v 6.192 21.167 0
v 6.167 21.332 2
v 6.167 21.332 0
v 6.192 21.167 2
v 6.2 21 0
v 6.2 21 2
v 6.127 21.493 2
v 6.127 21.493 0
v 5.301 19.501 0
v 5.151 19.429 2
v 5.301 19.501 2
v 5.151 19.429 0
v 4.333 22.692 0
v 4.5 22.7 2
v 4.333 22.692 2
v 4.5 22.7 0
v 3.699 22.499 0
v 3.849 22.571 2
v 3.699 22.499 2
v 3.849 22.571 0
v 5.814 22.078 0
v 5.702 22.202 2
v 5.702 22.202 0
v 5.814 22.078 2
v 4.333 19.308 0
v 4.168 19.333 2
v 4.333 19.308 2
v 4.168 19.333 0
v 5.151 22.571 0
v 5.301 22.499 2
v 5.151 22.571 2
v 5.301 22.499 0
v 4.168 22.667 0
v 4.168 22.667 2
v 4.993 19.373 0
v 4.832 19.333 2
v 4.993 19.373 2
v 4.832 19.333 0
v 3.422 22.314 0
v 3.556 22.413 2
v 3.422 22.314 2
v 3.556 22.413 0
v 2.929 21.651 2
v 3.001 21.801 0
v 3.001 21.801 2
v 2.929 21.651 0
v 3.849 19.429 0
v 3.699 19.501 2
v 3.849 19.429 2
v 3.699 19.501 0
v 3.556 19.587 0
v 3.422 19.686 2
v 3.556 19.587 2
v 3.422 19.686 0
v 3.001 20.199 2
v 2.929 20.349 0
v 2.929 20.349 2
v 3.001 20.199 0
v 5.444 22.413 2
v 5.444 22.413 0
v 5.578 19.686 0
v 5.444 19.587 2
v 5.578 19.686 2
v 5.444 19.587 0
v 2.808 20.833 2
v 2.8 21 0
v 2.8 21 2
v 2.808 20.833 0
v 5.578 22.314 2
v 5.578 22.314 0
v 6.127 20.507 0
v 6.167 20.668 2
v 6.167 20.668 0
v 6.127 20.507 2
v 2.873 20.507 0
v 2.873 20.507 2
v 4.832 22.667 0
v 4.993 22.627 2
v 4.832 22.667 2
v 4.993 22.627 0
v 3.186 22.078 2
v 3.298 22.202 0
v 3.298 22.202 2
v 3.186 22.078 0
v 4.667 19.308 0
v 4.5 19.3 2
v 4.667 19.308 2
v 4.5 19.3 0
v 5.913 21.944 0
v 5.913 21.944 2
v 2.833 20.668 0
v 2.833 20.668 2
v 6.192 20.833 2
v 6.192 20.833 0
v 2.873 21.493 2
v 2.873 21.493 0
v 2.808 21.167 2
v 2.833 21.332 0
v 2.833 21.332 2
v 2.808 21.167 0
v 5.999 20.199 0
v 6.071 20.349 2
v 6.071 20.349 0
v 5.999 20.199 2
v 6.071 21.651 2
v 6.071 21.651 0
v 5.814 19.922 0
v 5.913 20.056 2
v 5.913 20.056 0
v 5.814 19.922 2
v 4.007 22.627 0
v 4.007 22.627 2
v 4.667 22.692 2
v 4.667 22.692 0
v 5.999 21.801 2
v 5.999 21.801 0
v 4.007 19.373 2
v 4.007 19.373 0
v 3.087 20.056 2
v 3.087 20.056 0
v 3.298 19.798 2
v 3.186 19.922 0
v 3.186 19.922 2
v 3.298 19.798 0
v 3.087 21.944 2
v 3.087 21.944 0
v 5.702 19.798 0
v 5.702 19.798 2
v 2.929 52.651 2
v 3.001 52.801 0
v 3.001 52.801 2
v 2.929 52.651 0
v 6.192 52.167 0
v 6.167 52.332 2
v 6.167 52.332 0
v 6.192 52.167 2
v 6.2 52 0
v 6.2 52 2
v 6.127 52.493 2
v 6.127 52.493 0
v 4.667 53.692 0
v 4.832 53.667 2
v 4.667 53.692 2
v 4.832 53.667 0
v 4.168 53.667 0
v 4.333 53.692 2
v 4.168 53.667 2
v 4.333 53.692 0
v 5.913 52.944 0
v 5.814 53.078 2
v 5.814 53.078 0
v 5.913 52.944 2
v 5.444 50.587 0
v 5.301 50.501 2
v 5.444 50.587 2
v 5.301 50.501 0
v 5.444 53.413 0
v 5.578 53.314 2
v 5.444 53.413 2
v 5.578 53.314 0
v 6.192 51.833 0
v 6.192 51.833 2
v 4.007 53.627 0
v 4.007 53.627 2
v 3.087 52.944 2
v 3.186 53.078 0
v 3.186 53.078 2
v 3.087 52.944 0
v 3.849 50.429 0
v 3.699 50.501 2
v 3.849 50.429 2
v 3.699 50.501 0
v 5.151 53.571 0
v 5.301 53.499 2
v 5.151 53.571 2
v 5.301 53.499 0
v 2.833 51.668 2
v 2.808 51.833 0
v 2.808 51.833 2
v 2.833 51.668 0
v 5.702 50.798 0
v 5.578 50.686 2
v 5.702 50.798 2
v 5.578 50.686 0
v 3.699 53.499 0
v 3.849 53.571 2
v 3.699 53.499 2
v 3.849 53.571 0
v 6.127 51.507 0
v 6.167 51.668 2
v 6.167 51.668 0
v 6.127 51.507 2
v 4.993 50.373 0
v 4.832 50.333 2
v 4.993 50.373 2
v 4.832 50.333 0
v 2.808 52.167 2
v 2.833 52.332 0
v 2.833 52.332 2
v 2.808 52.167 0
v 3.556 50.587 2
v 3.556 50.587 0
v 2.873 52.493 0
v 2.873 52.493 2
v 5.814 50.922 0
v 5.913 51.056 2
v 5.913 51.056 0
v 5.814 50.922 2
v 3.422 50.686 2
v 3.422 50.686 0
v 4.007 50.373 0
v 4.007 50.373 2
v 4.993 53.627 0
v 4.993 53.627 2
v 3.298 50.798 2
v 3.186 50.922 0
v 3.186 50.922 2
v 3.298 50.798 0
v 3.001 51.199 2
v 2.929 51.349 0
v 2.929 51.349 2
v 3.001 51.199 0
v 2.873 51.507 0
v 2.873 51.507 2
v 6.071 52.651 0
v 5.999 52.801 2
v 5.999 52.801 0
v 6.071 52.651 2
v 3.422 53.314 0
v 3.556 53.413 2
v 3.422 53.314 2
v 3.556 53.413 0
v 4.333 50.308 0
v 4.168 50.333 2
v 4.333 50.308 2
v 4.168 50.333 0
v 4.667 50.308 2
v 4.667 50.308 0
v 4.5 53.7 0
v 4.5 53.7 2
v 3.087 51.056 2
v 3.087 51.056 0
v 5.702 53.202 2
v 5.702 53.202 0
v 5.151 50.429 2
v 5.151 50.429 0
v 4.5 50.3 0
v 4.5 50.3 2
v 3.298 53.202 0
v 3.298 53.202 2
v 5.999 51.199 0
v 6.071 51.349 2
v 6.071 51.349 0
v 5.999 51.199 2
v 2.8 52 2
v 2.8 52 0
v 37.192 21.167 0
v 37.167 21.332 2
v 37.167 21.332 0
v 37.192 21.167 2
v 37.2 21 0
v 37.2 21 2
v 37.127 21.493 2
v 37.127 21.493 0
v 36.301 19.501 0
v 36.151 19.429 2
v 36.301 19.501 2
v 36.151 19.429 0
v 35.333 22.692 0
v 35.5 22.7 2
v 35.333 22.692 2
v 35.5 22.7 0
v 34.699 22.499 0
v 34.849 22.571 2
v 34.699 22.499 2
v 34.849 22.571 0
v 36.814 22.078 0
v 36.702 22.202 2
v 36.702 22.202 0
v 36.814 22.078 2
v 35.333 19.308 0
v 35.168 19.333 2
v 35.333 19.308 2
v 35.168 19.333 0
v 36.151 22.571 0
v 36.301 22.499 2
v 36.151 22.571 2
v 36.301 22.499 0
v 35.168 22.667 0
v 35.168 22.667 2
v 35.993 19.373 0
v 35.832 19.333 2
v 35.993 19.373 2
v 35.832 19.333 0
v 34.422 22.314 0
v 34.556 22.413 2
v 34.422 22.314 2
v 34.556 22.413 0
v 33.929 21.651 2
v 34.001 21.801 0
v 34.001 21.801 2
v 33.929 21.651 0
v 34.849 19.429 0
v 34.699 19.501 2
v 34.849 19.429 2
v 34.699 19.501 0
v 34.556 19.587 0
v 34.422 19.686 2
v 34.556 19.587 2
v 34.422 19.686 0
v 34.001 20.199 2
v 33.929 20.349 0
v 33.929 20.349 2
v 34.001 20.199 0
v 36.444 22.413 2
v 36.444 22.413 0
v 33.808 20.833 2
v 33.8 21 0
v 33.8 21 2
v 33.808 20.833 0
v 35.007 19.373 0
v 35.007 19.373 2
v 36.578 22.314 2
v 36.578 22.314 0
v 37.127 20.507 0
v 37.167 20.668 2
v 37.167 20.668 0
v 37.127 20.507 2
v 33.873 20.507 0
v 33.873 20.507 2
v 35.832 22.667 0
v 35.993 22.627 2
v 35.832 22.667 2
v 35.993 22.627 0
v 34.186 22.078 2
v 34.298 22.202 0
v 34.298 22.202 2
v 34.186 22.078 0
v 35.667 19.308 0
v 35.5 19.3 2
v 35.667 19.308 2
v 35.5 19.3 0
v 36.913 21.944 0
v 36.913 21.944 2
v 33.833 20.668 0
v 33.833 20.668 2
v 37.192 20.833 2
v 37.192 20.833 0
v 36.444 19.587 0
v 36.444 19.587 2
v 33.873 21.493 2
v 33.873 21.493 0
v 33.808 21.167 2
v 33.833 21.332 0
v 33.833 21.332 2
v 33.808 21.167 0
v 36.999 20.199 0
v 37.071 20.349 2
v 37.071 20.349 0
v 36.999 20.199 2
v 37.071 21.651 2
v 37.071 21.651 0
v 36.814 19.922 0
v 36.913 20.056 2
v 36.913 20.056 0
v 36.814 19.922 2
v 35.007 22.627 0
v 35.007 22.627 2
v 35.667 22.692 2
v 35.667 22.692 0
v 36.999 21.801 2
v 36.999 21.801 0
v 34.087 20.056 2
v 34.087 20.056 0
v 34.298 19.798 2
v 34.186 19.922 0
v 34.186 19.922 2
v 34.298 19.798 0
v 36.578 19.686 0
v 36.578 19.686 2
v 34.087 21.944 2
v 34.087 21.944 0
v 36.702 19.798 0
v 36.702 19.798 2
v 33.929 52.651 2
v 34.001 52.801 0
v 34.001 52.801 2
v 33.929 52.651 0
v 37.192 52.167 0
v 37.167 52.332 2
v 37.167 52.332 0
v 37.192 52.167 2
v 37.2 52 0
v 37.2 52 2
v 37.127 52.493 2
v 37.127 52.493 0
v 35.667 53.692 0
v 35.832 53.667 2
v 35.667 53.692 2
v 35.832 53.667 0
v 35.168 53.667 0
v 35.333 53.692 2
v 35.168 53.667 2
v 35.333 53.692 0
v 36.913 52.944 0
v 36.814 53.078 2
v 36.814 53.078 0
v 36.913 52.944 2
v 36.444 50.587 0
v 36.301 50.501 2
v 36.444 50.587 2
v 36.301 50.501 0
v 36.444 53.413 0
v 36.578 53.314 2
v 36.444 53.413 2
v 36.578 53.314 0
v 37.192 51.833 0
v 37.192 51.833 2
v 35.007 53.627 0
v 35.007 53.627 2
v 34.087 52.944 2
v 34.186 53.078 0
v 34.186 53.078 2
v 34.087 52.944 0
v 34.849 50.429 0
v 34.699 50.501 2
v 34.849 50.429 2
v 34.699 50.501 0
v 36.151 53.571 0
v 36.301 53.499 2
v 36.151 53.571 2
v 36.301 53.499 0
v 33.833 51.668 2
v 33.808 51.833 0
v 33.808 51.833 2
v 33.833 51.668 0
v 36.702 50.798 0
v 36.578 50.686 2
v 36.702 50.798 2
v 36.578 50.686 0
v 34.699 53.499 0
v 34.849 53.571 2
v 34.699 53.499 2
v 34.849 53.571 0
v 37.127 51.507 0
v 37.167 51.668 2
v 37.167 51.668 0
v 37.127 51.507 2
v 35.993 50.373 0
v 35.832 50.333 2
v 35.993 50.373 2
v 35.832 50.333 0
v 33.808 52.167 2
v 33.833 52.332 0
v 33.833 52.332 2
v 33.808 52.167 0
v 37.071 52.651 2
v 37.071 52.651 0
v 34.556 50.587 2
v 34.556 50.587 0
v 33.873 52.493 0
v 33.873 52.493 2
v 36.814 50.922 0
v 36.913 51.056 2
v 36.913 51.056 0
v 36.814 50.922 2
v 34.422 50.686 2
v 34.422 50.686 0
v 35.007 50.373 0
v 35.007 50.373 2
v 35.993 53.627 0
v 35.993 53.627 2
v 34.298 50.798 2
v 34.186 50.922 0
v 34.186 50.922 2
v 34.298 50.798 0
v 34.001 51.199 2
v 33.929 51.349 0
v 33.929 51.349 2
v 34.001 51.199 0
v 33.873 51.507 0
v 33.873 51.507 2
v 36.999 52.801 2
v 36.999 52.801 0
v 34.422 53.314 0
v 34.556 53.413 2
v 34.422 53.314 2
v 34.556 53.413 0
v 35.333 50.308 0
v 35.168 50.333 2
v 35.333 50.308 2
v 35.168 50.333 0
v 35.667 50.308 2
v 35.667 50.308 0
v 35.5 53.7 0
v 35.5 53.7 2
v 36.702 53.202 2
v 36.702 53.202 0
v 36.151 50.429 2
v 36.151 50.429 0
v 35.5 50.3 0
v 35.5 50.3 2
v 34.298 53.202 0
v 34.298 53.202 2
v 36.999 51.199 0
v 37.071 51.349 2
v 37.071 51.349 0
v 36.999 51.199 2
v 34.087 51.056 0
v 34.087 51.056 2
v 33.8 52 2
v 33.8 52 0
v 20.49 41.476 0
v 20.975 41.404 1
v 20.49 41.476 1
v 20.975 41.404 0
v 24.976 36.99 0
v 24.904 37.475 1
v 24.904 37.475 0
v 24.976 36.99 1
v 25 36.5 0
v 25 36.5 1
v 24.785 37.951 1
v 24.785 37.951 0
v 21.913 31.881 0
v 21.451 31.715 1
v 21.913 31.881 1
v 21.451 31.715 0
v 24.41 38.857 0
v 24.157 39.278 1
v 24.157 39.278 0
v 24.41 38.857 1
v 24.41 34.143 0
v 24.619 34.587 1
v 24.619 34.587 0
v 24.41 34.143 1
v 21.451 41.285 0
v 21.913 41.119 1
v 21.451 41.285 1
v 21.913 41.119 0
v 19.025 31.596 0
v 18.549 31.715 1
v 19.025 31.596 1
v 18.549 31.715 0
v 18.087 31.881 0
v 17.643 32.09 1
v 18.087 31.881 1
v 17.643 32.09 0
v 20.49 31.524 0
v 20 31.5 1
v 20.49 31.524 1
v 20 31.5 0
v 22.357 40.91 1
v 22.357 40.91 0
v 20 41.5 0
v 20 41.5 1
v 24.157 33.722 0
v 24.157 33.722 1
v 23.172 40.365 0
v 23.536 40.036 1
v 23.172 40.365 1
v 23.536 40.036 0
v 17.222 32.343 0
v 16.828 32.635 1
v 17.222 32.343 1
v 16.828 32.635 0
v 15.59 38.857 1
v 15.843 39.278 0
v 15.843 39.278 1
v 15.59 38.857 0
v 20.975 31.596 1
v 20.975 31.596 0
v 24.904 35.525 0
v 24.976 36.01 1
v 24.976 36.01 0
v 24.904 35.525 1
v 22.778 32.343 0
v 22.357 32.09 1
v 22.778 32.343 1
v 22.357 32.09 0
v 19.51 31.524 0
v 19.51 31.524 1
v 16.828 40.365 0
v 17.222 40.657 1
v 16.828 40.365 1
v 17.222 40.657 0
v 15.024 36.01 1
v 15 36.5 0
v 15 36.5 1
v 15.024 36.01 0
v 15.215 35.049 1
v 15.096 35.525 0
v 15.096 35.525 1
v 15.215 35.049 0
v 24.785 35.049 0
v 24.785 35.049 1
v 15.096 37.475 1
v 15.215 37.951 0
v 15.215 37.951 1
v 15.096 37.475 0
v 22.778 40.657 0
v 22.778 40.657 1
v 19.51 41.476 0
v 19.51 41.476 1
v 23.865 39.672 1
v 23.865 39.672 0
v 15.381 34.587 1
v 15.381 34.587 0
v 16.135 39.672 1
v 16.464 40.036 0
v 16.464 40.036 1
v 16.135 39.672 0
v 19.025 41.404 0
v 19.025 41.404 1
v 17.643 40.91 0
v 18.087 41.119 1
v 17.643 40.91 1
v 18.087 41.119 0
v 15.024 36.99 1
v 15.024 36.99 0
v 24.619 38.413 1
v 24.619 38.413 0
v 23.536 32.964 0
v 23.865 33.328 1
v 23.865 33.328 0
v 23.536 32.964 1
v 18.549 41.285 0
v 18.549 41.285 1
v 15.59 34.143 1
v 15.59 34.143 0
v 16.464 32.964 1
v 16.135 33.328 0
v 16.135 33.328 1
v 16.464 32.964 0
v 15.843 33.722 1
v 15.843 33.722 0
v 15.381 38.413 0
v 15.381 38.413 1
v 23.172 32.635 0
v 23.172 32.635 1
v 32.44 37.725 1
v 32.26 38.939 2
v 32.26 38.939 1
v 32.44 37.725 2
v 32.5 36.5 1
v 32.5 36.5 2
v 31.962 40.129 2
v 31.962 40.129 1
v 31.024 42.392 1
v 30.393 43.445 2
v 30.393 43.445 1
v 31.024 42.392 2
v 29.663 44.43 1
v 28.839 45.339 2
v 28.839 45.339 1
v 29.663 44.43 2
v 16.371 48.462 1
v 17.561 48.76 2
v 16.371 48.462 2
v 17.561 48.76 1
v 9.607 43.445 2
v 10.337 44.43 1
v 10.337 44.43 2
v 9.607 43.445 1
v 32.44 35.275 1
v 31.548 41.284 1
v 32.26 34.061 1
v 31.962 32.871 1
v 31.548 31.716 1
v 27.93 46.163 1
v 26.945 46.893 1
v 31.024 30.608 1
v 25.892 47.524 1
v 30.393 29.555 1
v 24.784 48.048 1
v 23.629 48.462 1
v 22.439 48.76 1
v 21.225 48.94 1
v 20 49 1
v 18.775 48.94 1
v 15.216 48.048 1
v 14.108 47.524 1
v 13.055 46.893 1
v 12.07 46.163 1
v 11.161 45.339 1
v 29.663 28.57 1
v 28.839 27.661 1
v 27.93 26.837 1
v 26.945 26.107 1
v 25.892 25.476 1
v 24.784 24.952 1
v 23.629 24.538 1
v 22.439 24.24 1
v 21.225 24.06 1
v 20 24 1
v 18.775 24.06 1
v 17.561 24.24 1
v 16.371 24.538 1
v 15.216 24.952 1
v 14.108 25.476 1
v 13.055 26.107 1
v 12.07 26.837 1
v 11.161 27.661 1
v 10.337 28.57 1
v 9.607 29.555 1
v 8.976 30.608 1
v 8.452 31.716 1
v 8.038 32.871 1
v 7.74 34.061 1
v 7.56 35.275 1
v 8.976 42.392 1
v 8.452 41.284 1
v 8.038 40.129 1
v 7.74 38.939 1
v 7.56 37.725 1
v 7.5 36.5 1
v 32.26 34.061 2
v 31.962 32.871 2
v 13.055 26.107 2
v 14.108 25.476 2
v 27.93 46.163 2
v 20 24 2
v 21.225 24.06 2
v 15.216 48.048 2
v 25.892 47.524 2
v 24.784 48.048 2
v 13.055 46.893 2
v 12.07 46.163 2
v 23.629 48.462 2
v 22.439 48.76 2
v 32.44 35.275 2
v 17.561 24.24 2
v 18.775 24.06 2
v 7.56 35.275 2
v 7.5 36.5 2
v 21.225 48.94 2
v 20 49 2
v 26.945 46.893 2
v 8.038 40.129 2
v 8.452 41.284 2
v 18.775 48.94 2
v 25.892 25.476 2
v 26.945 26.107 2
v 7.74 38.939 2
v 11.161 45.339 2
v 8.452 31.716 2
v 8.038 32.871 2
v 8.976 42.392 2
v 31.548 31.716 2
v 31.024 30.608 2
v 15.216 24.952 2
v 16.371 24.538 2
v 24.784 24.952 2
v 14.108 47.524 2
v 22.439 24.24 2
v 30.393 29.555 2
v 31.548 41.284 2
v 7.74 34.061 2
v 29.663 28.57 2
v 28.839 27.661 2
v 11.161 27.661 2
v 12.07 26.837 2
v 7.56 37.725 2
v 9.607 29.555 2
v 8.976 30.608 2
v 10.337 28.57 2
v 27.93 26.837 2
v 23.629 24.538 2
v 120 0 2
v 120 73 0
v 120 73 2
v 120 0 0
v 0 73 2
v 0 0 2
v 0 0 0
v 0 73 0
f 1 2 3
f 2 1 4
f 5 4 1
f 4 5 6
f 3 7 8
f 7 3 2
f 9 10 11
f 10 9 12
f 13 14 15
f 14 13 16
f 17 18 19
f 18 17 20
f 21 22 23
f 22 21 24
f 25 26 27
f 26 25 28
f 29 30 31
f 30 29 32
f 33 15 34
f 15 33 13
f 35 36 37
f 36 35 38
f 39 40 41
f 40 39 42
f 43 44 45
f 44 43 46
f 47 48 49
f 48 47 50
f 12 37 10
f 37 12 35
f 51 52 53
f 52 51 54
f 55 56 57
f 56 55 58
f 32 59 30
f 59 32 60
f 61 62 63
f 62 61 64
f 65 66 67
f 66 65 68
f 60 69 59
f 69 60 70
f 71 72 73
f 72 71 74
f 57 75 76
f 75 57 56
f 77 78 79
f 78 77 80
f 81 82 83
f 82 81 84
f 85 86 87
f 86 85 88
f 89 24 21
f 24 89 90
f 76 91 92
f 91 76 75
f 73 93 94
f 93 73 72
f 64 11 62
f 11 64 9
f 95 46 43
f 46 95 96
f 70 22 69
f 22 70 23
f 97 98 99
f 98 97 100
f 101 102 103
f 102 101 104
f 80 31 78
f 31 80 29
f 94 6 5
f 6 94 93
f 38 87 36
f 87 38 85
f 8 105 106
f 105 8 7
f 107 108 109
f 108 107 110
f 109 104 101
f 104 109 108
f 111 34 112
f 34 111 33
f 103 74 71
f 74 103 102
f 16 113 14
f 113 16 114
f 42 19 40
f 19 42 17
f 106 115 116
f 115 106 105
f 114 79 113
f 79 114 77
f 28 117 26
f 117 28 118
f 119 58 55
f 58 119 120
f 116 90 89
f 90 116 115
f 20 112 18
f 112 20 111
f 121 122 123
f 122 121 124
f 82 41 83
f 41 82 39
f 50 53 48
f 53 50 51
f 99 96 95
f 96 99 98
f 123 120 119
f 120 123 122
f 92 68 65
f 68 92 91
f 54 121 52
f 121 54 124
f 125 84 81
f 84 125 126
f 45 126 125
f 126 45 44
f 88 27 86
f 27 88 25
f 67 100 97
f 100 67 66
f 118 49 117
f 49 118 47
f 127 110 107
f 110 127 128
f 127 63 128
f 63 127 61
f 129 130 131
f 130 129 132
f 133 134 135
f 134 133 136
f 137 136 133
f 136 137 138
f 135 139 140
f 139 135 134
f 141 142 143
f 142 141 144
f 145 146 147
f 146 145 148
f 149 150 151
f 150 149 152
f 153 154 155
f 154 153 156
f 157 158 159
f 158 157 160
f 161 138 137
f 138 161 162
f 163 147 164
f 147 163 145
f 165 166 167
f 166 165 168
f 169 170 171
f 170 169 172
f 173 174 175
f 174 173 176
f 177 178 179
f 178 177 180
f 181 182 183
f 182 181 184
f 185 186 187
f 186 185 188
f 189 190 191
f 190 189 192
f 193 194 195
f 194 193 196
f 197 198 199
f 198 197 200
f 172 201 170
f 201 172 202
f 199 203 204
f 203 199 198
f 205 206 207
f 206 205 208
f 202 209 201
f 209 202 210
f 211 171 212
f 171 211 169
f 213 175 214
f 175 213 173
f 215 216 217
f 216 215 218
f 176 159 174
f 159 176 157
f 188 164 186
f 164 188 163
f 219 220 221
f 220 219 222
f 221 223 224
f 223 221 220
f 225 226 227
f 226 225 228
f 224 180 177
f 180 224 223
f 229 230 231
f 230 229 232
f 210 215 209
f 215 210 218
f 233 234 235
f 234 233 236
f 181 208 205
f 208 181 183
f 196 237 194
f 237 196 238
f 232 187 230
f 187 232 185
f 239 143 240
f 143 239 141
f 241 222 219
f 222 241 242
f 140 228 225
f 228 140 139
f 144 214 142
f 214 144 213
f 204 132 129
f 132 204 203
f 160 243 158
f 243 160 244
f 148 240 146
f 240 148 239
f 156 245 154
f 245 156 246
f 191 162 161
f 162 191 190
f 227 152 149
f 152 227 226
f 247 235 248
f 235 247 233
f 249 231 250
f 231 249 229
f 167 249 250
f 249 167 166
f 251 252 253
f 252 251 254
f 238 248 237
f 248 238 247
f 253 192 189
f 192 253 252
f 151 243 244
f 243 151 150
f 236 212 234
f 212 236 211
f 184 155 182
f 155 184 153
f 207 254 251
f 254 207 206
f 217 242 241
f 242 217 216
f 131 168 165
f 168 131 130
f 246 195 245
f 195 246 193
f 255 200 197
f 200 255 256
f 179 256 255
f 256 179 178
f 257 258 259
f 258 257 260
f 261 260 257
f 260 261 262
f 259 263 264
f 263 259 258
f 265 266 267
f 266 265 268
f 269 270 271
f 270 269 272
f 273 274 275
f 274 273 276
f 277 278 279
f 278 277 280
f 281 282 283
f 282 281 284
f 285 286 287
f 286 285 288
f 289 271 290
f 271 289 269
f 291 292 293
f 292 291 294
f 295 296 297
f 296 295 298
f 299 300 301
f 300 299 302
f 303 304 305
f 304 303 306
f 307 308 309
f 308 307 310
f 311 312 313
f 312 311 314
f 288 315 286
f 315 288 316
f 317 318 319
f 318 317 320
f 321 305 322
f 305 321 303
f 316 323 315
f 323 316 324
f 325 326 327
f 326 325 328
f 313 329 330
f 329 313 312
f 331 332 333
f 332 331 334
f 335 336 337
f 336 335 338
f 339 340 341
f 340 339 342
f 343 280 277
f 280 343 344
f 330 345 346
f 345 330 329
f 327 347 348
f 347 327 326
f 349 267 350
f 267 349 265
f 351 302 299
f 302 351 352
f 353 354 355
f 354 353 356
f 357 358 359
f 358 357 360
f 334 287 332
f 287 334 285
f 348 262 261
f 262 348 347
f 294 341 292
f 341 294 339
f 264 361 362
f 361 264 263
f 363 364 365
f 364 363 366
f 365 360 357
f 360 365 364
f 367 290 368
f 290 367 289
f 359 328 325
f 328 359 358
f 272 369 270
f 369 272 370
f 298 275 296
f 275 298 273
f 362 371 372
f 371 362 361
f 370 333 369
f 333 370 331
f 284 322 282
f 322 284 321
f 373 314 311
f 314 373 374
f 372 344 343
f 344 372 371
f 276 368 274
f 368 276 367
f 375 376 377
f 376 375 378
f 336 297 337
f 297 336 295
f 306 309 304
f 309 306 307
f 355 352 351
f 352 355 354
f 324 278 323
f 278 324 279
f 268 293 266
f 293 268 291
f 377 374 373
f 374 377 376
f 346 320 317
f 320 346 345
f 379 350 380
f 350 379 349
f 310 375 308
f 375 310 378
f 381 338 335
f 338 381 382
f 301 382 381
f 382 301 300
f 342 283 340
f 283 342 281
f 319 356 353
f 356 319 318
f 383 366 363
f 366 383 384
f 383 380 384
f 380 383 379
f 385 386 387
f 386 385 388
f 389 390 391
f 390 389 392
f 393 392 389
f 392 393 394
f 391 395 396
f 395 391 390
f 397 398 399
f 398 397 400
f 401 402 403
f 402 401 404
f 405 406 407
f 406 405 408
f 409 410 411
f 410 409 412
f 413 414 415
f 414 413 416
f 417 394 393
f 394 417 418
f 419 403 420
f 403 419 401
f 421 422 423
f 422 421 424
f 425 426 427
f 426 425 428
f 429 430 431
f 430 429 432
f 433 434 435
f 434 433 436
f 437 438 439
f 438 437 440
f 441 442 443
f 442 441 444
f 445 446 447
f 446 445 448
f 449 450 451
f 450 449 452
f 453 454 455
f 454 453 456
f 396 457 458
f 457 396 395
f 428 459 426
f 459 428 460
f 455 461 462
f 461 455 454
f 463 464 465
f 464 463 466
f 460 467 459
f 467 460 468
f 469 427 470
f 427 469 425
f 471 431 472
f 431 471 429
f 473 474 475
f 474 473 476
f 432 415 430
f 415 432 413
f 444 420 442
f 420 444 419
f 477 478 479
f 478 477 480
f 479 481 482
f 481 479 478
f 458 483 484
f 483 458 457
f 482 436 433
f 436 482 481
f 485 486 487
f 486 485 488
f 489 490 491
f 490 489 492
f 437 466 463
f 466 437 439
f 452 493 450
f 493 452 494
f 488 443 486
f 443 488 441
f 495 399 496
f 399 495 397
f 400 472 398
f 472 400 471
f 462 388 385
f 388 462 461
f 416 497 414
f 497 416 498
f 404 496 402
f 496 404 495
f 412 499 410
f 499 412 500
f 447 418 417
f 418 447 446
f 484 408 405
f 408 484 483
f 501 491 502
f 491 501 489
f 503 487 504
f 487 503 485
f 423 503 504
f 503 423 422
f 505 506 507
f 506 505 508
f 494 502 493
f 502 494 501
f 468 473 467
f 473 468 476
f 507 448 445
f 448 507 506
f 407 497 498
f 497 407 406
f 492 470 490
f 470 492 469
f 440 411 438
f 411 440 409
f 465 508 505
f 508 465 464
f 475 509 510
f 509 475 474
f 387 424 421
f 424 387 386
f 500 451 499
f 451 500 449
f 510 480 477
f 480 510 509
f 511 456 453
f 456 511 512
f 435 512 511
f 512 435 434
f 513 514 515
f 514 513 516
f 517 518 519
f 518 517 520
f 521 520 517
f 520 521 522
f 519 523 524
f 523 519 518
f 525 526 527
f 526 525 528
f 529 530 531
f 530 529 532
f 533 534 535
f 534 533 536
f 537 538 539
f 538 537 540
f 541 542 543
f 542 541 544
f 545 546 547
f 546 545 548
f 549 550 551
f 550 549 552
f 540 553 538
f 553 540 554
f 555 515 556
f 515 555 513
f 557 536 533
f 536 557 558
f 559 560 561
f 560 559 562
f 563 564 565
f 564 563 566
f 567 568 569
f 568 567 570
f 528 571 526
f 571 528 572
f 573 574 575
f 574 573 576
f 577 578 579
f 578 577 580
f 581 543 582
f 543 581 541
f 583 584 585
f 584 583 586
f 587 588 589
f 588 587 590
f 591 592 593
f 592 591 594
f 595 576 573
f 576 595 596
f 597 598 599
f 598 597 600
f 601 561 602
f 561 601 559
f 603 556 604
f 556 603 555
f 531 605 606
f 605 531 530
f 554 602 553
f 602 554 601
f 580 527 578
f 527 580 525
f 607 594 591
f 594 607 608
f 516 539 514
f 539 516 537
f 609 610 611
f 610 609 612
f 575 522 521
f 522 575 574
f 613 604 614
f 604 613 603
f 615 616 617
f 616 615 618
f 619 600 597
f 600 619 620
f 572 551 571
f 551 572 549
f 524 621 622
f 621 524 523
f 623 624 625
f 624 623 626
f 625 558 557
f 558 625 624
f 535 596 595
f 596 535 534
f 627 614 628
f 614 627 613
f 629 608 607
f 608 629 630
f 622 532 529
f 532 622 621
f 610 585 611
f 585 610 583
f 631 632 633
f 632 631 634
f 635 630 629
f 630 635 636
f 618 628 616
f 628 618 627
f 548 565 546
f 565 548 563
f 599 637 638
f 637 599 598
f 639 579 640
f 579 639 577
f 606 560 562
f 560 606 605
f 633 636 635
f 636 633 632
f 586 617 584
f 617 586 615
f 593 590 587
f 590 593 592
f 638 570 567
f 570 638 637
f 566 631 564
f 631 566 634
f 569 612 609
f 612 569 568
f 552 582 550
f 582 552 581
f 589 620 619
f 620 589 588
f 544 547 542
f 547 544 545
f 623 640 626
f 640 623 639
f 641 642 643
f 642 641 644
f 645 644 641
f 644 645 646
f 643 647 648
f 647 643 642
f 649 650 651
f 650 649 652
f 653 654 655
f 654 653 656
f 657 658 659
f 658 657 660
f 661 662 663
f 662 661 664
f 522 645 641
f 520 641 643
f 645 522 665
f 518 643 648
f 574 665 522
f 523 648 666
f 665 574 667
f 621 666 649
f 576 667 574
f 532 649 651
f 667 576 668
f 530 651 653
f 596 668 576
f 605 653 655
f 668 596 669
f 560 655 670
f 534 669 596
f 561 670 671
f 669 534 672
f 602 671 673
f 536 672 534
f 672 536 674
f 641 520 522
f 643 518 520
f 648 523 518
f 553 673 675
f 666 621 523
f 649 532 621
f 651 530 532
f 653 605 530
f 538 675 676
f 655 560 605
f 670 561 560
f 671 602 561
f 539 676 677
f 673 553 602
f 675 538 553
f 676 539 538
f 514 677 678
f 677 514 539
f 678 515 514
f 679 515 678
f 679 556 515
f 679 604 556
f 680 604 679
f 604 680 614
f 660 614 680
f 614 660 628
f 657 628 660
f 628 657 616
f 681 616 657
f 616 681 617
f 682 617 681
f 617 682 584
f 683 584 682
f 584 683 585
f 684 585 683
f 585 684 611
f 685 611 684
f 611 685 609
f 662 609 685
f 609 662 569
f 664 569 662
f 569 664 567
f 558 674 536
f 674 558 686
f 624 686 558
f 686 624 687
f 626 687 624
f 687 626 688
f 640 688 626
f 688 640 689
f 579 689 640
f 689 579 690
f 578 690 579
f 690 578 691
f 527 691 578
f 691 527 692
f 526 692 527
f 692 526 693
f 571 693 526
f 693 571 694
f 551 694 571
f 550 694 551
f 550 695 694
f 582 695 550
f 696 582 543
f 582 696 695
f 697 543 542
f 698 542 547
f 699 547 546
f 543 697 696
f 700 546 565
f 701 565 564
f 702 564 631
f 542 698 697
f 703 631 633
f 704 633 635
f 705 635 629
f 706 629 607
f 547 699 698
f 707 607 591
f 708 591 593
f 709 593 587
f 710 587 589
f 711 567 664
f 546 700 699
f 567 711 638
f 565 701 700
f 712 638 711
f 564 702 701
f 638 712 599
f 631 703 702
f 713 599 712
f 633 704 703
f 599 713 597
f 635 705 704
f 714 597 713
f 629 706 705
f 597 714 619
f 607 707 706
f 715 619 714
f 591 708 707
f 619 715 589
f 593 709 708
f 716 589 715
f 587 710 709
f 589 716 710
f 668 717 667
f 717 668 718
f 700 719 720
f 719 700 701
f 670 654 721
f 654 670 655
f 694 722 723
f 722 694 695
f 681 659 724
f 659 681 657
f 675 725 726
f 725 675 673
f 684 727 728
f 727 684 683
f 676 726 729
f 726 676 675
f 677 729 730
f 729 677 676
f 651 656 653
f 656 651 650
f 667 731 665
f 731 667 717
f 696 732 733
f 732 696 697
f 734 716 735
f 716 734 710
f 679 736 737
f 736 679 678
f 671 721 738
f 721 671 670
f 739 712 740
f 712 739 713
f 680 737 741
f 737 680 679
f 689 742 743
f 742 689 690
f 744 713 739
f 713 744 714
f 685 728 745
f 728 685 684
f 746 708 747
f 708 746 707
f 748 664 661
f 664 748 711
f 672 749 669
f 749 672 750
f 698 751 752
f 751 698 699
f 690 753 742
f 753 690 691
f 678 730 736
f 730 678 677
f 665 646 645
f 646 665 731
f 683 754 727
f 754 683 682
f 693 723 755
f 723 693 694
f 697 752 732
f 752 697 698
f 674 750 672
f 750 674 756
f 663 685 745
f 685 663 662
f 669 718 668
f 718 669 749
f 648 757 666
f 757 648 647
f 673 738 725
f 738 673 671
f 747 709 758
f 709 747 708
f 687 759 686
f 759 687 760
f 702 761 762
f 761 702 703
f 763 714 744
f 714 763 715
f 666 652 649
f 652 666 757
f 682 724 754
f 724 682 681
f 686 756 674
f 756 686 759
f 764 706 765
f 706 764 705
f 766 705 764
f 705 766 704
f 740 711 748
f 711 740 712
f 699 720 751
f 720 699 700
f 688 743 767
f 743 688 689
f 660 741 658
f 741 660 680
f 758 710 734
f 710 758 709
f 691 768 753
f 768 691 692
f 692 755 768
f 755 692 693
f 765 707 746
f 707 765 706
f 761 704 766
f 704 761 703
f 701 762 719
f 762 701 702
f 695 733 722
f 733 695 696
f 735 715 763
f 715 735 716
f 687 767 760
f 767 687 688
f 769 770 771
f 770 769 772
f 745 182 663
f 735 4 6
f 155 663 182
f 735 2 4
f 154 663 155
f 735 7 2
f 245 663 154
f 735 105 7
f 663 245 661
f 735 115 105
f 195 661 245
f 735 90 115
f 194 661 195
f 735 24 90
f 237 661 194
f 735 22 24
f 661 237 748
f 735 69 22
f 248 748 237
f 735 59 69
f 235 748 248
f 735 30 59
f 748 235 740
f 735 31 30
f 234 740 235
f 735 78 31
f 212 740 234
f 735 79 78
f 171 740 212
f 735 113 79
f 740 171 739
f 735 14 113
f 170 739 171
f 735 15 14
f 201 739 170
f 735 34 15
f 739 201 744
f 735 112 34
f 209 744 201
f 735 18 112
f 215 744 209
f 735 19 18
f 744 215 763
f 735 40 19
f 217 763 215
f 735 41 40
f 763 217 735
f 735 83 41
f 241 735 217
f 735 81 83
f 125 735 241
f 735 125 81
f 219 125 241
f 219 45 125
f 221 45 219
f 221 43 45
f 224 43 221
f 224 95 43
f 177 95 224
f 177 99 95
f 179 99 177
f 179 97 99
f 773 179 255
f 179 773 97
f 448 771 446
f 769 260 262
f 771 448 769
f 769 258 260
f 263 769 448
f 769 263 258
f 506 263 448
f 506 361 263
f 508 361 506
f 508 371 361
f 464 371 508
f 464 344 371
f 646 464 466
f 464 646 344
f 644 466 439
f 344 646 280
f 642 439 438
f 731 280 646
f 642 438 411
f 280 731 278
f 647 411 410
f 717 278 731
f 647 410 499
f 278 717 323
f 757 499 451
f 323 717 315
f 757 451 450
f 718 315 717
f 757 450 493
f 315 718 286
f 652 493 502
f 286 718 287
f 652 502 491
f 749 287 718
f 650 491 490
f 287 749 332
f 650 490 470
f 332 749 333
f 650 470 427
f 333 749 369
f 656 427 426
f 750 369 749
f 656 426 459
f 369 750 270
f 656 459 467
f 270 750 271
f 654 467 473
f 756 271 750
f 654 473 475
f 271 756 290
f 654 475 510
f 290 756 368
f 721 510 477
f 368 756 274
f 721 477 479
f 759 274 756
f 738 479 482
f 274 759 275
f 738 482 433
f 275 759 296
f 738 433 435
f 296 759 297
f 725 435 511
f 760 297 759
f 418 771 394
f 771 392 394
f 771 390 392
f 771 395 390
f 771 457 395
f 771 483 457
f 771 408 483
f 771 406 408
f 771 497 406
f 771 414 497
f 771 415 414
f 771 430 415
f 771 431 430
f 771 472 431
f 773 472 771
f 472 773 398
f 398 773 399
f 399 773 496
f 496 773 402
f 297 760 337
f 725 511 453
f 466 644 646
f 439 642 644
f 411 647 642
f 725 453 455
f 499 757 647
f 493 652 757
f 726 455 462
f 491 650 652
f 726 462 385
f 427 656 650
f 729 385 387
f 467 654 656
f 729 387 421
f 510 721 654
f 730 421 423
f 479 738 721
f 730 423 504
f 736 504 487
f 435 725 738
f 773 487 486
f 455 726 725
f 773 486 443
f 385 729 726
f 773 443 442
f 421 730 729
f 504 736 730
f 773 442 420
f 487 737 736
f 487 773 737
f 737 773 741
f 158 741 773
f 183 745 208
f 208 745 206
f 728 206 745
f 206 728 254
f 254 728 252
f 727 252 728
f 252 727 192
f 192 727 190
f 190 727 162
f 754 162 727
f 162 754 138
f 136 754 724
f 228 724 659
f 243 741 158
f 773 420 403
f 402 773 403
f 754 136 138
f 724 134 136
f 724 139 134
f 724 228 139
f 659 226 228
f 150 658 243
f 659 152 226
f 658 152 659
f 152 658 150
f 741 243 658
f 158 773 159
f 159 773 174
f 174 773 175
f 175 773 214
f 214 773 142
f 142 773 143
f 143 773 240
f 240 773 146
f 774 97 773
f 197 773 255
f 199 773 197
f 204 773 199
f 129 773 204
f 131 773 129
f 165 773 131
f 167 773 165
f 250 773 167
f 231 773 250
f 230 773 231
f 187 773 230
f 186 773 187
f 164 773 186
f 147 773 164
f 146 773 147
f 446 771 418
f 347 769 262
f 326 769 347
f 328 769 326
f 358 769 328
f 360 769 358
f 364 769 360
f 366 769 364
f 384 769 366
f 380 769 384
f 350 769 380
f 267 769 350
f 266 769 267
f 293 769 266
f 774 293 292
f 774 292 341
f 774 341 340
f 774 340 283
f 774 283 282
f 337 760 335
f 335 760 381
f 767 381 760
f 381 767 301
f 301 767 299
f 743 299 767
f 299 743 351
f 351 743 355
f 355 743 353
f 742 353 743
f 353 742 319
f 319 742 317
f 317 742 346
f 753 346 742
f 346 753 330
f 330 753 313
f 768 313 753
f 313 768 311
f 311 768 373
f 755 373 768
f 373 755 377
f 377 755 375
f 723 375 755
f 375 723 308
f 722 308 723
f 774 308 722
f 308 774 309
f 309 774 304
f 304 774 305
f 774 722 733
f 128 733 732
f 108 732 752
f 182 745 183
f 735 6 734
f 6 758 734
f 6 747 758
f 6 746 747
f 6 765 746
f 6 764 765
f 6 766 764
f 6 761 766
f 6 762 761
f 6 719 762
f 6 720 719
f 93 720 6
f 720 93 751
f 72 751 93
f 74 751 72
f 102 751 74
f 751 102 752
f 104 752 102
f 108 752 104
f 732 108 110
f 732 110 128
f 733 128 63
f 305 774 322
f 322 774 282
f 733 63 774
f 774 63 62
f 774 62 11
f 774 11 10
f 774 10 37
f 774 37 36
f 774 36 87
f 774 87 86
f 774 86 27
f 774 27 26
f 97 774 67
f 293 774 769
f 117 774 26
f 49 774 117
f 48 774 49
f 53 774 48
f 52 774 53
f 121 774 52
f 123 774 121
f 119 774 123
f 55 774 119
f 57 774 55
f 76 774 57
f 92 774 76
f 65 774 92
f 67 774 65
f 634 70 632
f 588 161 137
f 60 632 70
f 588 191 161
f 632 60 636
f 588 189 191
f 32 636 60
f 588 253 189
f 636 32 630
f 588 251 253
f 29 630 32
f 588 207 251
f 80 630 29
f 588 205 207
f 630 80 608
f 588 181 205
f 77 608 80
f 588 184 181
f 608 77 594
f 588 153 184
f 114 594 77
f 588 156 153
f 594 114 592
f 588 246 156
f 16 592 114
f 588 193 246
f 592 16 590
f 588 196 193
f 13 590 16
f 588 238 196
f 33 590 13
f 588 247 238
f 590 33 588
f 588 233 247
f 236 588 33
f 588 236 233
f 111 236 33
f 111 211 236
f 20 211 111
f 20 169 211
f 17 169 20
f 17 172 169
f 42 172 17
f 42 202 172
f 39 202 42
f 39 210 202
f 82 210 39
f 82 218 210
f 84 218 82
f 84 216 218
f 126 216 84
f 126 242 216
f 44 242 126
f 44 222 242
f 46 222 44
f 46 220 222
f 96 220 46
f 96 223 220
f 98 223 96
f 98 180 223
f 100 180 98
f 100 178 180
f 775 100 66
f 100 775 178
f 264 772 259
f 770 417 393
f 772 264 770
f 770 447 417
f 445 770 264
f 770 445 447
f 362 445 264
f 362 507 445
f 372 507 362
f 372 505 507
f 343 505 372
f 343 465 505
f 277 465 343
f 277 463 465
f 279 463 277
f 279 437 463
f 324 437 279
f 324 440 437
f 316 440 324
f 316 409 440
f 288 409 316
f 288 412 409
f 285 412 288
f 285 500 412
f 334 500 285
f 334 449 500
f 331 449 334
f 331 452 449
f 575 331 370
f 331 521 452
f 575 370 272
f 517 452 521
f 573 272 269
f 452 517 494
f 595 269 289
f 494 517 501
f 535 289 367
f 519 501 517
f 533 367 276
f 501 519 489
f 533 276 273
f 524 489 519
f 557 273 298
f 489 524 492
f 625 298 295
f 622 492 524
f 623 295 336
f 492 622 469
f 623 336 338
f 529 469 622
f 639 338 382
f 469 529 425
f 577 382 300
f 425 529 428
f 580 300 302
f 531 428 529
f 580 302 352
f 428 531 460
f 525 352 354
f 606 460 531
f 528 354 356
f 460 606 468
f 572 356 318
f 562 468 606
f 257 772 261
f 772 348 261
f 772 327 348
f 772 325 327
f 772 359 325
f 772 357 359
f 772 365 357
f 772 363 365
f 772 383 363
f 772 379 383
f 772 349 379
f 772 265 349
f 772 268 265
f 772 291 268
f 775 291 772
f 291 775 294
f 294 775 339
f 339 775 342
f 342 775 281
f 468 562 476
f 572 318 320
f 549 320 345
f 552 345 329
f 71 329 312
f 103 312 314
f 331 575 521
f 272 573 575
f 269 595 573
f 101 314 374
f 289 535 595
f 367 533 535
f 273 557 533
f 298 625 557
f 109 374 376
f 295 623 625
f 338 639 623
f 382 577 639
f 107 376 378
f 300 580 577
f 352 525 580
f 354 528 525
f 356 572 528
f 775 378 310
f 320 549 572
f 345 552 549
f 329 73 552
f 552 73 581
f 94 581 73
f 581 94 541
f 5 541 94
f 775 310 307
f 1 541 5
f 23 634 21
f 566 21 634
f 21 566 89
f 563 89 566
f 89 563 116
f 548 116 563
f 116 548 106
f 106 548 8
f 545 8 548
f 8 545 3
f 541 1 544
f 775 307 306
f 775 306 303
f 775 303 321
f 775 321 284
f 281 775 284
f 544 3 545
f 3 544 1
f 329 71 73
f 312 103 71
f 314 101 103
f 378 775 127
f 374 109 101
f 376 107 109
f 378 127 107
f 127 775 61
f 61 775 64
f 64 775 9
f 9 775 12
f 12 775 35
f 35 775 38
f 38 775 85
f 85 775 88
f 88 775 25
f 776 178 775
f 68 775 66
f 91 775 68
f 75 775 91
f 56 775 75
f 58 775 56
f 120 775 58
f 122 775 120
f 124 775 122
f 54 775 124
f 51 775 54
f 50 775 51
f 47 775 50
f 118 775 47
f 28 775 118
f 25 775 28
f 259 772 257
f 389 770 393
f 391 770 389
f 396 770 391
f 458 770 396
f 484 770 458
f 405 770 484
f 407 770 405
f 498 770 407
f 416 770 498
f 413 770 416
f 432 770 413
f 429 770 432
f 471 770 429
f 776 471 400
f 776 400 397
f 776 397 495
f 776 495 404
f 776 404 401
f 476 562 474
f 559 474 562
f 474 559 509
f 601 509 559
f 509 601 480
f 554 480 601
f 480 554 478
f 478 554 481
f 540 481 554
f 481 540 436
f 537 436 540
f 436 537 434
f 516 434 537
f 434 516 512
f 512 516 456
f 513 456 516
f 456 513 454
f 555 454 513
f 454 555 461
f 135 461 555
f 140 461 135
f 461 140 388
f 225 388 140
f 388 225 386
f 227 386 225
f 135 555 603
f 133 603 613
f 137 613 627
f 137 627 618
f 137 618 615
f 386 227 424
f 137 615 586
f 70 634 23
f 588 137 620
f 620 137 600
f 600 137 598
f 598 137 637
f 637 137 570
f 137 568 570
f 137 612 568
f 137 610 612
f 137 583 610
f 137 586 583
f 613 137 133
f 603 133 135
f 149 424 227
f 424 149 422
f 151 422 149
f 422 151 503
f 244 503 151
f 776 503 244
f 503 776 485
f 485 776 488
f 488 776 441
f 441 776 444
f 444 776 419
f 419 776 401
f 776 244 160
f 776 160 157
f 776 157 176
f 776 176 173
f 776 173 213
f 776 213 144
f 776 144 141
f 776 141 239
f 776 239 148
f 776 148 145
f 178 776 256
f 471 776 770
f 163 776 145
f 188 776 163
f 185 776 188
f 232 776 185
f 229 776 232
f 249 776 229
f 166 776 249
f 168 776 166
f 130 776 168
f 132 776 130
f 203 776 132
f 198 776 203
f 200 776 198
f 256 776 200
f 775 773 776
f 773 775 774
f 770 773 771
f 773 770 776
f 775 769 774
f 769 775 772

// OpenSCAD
// Motor plate: flat plate with a NEMA 17 mount.
// Redrawn from Tim's TinkerCad export "Polar Potter Custom.stl" (largest part on that plate).
// All sizes in mm. Origin = the plate's front-left bottom corner.

plate_w = 120;          // X
plate_d = 73;           // Y
plate_t = 2;            // thickness (original 2; thin for a motor mount, Tim's call)

// NEMA 17 mount
motor_x = 20;           // centre of the motor from the plate's left edge
motor_y = 36.5;         // centre of the motor from the plate's front edge
hole_pitch = 31;        // NEMA 17 screw spacing (standard)
screw_d = 3.4;          // M3 clearance. Original 3.0, which usually prints too tight.
shaft_d = 10;           // through hole for the shaft
boss_d = 25;            // recess for the motor's 22 mm centring collar
boss_depth = 1;         // depth of that recess (from the top face)

$fn = 64;

difference() {
  cube([plate_w, plate_d, plate_t]);
  translate([motor_x, motor_y, 0]) {
    // shaft hole
    translate([0, 0, -1]) cylinder(d = shaft_d, h = plate_t + 2);
    // collar recess
    translate([0, 0, plate_t - boss_depth]) cylinder(d = boss_d, h = boss_depth + 1);
    // four screw holes
    for (sx = [-1, 1], sy = [-1, 1])
      translate([sx * hole_pitch / 2, sy * hole_pitch / 2, -1])
        cylinder(d = screw_d, h = plate_t + 2);
  }
}
